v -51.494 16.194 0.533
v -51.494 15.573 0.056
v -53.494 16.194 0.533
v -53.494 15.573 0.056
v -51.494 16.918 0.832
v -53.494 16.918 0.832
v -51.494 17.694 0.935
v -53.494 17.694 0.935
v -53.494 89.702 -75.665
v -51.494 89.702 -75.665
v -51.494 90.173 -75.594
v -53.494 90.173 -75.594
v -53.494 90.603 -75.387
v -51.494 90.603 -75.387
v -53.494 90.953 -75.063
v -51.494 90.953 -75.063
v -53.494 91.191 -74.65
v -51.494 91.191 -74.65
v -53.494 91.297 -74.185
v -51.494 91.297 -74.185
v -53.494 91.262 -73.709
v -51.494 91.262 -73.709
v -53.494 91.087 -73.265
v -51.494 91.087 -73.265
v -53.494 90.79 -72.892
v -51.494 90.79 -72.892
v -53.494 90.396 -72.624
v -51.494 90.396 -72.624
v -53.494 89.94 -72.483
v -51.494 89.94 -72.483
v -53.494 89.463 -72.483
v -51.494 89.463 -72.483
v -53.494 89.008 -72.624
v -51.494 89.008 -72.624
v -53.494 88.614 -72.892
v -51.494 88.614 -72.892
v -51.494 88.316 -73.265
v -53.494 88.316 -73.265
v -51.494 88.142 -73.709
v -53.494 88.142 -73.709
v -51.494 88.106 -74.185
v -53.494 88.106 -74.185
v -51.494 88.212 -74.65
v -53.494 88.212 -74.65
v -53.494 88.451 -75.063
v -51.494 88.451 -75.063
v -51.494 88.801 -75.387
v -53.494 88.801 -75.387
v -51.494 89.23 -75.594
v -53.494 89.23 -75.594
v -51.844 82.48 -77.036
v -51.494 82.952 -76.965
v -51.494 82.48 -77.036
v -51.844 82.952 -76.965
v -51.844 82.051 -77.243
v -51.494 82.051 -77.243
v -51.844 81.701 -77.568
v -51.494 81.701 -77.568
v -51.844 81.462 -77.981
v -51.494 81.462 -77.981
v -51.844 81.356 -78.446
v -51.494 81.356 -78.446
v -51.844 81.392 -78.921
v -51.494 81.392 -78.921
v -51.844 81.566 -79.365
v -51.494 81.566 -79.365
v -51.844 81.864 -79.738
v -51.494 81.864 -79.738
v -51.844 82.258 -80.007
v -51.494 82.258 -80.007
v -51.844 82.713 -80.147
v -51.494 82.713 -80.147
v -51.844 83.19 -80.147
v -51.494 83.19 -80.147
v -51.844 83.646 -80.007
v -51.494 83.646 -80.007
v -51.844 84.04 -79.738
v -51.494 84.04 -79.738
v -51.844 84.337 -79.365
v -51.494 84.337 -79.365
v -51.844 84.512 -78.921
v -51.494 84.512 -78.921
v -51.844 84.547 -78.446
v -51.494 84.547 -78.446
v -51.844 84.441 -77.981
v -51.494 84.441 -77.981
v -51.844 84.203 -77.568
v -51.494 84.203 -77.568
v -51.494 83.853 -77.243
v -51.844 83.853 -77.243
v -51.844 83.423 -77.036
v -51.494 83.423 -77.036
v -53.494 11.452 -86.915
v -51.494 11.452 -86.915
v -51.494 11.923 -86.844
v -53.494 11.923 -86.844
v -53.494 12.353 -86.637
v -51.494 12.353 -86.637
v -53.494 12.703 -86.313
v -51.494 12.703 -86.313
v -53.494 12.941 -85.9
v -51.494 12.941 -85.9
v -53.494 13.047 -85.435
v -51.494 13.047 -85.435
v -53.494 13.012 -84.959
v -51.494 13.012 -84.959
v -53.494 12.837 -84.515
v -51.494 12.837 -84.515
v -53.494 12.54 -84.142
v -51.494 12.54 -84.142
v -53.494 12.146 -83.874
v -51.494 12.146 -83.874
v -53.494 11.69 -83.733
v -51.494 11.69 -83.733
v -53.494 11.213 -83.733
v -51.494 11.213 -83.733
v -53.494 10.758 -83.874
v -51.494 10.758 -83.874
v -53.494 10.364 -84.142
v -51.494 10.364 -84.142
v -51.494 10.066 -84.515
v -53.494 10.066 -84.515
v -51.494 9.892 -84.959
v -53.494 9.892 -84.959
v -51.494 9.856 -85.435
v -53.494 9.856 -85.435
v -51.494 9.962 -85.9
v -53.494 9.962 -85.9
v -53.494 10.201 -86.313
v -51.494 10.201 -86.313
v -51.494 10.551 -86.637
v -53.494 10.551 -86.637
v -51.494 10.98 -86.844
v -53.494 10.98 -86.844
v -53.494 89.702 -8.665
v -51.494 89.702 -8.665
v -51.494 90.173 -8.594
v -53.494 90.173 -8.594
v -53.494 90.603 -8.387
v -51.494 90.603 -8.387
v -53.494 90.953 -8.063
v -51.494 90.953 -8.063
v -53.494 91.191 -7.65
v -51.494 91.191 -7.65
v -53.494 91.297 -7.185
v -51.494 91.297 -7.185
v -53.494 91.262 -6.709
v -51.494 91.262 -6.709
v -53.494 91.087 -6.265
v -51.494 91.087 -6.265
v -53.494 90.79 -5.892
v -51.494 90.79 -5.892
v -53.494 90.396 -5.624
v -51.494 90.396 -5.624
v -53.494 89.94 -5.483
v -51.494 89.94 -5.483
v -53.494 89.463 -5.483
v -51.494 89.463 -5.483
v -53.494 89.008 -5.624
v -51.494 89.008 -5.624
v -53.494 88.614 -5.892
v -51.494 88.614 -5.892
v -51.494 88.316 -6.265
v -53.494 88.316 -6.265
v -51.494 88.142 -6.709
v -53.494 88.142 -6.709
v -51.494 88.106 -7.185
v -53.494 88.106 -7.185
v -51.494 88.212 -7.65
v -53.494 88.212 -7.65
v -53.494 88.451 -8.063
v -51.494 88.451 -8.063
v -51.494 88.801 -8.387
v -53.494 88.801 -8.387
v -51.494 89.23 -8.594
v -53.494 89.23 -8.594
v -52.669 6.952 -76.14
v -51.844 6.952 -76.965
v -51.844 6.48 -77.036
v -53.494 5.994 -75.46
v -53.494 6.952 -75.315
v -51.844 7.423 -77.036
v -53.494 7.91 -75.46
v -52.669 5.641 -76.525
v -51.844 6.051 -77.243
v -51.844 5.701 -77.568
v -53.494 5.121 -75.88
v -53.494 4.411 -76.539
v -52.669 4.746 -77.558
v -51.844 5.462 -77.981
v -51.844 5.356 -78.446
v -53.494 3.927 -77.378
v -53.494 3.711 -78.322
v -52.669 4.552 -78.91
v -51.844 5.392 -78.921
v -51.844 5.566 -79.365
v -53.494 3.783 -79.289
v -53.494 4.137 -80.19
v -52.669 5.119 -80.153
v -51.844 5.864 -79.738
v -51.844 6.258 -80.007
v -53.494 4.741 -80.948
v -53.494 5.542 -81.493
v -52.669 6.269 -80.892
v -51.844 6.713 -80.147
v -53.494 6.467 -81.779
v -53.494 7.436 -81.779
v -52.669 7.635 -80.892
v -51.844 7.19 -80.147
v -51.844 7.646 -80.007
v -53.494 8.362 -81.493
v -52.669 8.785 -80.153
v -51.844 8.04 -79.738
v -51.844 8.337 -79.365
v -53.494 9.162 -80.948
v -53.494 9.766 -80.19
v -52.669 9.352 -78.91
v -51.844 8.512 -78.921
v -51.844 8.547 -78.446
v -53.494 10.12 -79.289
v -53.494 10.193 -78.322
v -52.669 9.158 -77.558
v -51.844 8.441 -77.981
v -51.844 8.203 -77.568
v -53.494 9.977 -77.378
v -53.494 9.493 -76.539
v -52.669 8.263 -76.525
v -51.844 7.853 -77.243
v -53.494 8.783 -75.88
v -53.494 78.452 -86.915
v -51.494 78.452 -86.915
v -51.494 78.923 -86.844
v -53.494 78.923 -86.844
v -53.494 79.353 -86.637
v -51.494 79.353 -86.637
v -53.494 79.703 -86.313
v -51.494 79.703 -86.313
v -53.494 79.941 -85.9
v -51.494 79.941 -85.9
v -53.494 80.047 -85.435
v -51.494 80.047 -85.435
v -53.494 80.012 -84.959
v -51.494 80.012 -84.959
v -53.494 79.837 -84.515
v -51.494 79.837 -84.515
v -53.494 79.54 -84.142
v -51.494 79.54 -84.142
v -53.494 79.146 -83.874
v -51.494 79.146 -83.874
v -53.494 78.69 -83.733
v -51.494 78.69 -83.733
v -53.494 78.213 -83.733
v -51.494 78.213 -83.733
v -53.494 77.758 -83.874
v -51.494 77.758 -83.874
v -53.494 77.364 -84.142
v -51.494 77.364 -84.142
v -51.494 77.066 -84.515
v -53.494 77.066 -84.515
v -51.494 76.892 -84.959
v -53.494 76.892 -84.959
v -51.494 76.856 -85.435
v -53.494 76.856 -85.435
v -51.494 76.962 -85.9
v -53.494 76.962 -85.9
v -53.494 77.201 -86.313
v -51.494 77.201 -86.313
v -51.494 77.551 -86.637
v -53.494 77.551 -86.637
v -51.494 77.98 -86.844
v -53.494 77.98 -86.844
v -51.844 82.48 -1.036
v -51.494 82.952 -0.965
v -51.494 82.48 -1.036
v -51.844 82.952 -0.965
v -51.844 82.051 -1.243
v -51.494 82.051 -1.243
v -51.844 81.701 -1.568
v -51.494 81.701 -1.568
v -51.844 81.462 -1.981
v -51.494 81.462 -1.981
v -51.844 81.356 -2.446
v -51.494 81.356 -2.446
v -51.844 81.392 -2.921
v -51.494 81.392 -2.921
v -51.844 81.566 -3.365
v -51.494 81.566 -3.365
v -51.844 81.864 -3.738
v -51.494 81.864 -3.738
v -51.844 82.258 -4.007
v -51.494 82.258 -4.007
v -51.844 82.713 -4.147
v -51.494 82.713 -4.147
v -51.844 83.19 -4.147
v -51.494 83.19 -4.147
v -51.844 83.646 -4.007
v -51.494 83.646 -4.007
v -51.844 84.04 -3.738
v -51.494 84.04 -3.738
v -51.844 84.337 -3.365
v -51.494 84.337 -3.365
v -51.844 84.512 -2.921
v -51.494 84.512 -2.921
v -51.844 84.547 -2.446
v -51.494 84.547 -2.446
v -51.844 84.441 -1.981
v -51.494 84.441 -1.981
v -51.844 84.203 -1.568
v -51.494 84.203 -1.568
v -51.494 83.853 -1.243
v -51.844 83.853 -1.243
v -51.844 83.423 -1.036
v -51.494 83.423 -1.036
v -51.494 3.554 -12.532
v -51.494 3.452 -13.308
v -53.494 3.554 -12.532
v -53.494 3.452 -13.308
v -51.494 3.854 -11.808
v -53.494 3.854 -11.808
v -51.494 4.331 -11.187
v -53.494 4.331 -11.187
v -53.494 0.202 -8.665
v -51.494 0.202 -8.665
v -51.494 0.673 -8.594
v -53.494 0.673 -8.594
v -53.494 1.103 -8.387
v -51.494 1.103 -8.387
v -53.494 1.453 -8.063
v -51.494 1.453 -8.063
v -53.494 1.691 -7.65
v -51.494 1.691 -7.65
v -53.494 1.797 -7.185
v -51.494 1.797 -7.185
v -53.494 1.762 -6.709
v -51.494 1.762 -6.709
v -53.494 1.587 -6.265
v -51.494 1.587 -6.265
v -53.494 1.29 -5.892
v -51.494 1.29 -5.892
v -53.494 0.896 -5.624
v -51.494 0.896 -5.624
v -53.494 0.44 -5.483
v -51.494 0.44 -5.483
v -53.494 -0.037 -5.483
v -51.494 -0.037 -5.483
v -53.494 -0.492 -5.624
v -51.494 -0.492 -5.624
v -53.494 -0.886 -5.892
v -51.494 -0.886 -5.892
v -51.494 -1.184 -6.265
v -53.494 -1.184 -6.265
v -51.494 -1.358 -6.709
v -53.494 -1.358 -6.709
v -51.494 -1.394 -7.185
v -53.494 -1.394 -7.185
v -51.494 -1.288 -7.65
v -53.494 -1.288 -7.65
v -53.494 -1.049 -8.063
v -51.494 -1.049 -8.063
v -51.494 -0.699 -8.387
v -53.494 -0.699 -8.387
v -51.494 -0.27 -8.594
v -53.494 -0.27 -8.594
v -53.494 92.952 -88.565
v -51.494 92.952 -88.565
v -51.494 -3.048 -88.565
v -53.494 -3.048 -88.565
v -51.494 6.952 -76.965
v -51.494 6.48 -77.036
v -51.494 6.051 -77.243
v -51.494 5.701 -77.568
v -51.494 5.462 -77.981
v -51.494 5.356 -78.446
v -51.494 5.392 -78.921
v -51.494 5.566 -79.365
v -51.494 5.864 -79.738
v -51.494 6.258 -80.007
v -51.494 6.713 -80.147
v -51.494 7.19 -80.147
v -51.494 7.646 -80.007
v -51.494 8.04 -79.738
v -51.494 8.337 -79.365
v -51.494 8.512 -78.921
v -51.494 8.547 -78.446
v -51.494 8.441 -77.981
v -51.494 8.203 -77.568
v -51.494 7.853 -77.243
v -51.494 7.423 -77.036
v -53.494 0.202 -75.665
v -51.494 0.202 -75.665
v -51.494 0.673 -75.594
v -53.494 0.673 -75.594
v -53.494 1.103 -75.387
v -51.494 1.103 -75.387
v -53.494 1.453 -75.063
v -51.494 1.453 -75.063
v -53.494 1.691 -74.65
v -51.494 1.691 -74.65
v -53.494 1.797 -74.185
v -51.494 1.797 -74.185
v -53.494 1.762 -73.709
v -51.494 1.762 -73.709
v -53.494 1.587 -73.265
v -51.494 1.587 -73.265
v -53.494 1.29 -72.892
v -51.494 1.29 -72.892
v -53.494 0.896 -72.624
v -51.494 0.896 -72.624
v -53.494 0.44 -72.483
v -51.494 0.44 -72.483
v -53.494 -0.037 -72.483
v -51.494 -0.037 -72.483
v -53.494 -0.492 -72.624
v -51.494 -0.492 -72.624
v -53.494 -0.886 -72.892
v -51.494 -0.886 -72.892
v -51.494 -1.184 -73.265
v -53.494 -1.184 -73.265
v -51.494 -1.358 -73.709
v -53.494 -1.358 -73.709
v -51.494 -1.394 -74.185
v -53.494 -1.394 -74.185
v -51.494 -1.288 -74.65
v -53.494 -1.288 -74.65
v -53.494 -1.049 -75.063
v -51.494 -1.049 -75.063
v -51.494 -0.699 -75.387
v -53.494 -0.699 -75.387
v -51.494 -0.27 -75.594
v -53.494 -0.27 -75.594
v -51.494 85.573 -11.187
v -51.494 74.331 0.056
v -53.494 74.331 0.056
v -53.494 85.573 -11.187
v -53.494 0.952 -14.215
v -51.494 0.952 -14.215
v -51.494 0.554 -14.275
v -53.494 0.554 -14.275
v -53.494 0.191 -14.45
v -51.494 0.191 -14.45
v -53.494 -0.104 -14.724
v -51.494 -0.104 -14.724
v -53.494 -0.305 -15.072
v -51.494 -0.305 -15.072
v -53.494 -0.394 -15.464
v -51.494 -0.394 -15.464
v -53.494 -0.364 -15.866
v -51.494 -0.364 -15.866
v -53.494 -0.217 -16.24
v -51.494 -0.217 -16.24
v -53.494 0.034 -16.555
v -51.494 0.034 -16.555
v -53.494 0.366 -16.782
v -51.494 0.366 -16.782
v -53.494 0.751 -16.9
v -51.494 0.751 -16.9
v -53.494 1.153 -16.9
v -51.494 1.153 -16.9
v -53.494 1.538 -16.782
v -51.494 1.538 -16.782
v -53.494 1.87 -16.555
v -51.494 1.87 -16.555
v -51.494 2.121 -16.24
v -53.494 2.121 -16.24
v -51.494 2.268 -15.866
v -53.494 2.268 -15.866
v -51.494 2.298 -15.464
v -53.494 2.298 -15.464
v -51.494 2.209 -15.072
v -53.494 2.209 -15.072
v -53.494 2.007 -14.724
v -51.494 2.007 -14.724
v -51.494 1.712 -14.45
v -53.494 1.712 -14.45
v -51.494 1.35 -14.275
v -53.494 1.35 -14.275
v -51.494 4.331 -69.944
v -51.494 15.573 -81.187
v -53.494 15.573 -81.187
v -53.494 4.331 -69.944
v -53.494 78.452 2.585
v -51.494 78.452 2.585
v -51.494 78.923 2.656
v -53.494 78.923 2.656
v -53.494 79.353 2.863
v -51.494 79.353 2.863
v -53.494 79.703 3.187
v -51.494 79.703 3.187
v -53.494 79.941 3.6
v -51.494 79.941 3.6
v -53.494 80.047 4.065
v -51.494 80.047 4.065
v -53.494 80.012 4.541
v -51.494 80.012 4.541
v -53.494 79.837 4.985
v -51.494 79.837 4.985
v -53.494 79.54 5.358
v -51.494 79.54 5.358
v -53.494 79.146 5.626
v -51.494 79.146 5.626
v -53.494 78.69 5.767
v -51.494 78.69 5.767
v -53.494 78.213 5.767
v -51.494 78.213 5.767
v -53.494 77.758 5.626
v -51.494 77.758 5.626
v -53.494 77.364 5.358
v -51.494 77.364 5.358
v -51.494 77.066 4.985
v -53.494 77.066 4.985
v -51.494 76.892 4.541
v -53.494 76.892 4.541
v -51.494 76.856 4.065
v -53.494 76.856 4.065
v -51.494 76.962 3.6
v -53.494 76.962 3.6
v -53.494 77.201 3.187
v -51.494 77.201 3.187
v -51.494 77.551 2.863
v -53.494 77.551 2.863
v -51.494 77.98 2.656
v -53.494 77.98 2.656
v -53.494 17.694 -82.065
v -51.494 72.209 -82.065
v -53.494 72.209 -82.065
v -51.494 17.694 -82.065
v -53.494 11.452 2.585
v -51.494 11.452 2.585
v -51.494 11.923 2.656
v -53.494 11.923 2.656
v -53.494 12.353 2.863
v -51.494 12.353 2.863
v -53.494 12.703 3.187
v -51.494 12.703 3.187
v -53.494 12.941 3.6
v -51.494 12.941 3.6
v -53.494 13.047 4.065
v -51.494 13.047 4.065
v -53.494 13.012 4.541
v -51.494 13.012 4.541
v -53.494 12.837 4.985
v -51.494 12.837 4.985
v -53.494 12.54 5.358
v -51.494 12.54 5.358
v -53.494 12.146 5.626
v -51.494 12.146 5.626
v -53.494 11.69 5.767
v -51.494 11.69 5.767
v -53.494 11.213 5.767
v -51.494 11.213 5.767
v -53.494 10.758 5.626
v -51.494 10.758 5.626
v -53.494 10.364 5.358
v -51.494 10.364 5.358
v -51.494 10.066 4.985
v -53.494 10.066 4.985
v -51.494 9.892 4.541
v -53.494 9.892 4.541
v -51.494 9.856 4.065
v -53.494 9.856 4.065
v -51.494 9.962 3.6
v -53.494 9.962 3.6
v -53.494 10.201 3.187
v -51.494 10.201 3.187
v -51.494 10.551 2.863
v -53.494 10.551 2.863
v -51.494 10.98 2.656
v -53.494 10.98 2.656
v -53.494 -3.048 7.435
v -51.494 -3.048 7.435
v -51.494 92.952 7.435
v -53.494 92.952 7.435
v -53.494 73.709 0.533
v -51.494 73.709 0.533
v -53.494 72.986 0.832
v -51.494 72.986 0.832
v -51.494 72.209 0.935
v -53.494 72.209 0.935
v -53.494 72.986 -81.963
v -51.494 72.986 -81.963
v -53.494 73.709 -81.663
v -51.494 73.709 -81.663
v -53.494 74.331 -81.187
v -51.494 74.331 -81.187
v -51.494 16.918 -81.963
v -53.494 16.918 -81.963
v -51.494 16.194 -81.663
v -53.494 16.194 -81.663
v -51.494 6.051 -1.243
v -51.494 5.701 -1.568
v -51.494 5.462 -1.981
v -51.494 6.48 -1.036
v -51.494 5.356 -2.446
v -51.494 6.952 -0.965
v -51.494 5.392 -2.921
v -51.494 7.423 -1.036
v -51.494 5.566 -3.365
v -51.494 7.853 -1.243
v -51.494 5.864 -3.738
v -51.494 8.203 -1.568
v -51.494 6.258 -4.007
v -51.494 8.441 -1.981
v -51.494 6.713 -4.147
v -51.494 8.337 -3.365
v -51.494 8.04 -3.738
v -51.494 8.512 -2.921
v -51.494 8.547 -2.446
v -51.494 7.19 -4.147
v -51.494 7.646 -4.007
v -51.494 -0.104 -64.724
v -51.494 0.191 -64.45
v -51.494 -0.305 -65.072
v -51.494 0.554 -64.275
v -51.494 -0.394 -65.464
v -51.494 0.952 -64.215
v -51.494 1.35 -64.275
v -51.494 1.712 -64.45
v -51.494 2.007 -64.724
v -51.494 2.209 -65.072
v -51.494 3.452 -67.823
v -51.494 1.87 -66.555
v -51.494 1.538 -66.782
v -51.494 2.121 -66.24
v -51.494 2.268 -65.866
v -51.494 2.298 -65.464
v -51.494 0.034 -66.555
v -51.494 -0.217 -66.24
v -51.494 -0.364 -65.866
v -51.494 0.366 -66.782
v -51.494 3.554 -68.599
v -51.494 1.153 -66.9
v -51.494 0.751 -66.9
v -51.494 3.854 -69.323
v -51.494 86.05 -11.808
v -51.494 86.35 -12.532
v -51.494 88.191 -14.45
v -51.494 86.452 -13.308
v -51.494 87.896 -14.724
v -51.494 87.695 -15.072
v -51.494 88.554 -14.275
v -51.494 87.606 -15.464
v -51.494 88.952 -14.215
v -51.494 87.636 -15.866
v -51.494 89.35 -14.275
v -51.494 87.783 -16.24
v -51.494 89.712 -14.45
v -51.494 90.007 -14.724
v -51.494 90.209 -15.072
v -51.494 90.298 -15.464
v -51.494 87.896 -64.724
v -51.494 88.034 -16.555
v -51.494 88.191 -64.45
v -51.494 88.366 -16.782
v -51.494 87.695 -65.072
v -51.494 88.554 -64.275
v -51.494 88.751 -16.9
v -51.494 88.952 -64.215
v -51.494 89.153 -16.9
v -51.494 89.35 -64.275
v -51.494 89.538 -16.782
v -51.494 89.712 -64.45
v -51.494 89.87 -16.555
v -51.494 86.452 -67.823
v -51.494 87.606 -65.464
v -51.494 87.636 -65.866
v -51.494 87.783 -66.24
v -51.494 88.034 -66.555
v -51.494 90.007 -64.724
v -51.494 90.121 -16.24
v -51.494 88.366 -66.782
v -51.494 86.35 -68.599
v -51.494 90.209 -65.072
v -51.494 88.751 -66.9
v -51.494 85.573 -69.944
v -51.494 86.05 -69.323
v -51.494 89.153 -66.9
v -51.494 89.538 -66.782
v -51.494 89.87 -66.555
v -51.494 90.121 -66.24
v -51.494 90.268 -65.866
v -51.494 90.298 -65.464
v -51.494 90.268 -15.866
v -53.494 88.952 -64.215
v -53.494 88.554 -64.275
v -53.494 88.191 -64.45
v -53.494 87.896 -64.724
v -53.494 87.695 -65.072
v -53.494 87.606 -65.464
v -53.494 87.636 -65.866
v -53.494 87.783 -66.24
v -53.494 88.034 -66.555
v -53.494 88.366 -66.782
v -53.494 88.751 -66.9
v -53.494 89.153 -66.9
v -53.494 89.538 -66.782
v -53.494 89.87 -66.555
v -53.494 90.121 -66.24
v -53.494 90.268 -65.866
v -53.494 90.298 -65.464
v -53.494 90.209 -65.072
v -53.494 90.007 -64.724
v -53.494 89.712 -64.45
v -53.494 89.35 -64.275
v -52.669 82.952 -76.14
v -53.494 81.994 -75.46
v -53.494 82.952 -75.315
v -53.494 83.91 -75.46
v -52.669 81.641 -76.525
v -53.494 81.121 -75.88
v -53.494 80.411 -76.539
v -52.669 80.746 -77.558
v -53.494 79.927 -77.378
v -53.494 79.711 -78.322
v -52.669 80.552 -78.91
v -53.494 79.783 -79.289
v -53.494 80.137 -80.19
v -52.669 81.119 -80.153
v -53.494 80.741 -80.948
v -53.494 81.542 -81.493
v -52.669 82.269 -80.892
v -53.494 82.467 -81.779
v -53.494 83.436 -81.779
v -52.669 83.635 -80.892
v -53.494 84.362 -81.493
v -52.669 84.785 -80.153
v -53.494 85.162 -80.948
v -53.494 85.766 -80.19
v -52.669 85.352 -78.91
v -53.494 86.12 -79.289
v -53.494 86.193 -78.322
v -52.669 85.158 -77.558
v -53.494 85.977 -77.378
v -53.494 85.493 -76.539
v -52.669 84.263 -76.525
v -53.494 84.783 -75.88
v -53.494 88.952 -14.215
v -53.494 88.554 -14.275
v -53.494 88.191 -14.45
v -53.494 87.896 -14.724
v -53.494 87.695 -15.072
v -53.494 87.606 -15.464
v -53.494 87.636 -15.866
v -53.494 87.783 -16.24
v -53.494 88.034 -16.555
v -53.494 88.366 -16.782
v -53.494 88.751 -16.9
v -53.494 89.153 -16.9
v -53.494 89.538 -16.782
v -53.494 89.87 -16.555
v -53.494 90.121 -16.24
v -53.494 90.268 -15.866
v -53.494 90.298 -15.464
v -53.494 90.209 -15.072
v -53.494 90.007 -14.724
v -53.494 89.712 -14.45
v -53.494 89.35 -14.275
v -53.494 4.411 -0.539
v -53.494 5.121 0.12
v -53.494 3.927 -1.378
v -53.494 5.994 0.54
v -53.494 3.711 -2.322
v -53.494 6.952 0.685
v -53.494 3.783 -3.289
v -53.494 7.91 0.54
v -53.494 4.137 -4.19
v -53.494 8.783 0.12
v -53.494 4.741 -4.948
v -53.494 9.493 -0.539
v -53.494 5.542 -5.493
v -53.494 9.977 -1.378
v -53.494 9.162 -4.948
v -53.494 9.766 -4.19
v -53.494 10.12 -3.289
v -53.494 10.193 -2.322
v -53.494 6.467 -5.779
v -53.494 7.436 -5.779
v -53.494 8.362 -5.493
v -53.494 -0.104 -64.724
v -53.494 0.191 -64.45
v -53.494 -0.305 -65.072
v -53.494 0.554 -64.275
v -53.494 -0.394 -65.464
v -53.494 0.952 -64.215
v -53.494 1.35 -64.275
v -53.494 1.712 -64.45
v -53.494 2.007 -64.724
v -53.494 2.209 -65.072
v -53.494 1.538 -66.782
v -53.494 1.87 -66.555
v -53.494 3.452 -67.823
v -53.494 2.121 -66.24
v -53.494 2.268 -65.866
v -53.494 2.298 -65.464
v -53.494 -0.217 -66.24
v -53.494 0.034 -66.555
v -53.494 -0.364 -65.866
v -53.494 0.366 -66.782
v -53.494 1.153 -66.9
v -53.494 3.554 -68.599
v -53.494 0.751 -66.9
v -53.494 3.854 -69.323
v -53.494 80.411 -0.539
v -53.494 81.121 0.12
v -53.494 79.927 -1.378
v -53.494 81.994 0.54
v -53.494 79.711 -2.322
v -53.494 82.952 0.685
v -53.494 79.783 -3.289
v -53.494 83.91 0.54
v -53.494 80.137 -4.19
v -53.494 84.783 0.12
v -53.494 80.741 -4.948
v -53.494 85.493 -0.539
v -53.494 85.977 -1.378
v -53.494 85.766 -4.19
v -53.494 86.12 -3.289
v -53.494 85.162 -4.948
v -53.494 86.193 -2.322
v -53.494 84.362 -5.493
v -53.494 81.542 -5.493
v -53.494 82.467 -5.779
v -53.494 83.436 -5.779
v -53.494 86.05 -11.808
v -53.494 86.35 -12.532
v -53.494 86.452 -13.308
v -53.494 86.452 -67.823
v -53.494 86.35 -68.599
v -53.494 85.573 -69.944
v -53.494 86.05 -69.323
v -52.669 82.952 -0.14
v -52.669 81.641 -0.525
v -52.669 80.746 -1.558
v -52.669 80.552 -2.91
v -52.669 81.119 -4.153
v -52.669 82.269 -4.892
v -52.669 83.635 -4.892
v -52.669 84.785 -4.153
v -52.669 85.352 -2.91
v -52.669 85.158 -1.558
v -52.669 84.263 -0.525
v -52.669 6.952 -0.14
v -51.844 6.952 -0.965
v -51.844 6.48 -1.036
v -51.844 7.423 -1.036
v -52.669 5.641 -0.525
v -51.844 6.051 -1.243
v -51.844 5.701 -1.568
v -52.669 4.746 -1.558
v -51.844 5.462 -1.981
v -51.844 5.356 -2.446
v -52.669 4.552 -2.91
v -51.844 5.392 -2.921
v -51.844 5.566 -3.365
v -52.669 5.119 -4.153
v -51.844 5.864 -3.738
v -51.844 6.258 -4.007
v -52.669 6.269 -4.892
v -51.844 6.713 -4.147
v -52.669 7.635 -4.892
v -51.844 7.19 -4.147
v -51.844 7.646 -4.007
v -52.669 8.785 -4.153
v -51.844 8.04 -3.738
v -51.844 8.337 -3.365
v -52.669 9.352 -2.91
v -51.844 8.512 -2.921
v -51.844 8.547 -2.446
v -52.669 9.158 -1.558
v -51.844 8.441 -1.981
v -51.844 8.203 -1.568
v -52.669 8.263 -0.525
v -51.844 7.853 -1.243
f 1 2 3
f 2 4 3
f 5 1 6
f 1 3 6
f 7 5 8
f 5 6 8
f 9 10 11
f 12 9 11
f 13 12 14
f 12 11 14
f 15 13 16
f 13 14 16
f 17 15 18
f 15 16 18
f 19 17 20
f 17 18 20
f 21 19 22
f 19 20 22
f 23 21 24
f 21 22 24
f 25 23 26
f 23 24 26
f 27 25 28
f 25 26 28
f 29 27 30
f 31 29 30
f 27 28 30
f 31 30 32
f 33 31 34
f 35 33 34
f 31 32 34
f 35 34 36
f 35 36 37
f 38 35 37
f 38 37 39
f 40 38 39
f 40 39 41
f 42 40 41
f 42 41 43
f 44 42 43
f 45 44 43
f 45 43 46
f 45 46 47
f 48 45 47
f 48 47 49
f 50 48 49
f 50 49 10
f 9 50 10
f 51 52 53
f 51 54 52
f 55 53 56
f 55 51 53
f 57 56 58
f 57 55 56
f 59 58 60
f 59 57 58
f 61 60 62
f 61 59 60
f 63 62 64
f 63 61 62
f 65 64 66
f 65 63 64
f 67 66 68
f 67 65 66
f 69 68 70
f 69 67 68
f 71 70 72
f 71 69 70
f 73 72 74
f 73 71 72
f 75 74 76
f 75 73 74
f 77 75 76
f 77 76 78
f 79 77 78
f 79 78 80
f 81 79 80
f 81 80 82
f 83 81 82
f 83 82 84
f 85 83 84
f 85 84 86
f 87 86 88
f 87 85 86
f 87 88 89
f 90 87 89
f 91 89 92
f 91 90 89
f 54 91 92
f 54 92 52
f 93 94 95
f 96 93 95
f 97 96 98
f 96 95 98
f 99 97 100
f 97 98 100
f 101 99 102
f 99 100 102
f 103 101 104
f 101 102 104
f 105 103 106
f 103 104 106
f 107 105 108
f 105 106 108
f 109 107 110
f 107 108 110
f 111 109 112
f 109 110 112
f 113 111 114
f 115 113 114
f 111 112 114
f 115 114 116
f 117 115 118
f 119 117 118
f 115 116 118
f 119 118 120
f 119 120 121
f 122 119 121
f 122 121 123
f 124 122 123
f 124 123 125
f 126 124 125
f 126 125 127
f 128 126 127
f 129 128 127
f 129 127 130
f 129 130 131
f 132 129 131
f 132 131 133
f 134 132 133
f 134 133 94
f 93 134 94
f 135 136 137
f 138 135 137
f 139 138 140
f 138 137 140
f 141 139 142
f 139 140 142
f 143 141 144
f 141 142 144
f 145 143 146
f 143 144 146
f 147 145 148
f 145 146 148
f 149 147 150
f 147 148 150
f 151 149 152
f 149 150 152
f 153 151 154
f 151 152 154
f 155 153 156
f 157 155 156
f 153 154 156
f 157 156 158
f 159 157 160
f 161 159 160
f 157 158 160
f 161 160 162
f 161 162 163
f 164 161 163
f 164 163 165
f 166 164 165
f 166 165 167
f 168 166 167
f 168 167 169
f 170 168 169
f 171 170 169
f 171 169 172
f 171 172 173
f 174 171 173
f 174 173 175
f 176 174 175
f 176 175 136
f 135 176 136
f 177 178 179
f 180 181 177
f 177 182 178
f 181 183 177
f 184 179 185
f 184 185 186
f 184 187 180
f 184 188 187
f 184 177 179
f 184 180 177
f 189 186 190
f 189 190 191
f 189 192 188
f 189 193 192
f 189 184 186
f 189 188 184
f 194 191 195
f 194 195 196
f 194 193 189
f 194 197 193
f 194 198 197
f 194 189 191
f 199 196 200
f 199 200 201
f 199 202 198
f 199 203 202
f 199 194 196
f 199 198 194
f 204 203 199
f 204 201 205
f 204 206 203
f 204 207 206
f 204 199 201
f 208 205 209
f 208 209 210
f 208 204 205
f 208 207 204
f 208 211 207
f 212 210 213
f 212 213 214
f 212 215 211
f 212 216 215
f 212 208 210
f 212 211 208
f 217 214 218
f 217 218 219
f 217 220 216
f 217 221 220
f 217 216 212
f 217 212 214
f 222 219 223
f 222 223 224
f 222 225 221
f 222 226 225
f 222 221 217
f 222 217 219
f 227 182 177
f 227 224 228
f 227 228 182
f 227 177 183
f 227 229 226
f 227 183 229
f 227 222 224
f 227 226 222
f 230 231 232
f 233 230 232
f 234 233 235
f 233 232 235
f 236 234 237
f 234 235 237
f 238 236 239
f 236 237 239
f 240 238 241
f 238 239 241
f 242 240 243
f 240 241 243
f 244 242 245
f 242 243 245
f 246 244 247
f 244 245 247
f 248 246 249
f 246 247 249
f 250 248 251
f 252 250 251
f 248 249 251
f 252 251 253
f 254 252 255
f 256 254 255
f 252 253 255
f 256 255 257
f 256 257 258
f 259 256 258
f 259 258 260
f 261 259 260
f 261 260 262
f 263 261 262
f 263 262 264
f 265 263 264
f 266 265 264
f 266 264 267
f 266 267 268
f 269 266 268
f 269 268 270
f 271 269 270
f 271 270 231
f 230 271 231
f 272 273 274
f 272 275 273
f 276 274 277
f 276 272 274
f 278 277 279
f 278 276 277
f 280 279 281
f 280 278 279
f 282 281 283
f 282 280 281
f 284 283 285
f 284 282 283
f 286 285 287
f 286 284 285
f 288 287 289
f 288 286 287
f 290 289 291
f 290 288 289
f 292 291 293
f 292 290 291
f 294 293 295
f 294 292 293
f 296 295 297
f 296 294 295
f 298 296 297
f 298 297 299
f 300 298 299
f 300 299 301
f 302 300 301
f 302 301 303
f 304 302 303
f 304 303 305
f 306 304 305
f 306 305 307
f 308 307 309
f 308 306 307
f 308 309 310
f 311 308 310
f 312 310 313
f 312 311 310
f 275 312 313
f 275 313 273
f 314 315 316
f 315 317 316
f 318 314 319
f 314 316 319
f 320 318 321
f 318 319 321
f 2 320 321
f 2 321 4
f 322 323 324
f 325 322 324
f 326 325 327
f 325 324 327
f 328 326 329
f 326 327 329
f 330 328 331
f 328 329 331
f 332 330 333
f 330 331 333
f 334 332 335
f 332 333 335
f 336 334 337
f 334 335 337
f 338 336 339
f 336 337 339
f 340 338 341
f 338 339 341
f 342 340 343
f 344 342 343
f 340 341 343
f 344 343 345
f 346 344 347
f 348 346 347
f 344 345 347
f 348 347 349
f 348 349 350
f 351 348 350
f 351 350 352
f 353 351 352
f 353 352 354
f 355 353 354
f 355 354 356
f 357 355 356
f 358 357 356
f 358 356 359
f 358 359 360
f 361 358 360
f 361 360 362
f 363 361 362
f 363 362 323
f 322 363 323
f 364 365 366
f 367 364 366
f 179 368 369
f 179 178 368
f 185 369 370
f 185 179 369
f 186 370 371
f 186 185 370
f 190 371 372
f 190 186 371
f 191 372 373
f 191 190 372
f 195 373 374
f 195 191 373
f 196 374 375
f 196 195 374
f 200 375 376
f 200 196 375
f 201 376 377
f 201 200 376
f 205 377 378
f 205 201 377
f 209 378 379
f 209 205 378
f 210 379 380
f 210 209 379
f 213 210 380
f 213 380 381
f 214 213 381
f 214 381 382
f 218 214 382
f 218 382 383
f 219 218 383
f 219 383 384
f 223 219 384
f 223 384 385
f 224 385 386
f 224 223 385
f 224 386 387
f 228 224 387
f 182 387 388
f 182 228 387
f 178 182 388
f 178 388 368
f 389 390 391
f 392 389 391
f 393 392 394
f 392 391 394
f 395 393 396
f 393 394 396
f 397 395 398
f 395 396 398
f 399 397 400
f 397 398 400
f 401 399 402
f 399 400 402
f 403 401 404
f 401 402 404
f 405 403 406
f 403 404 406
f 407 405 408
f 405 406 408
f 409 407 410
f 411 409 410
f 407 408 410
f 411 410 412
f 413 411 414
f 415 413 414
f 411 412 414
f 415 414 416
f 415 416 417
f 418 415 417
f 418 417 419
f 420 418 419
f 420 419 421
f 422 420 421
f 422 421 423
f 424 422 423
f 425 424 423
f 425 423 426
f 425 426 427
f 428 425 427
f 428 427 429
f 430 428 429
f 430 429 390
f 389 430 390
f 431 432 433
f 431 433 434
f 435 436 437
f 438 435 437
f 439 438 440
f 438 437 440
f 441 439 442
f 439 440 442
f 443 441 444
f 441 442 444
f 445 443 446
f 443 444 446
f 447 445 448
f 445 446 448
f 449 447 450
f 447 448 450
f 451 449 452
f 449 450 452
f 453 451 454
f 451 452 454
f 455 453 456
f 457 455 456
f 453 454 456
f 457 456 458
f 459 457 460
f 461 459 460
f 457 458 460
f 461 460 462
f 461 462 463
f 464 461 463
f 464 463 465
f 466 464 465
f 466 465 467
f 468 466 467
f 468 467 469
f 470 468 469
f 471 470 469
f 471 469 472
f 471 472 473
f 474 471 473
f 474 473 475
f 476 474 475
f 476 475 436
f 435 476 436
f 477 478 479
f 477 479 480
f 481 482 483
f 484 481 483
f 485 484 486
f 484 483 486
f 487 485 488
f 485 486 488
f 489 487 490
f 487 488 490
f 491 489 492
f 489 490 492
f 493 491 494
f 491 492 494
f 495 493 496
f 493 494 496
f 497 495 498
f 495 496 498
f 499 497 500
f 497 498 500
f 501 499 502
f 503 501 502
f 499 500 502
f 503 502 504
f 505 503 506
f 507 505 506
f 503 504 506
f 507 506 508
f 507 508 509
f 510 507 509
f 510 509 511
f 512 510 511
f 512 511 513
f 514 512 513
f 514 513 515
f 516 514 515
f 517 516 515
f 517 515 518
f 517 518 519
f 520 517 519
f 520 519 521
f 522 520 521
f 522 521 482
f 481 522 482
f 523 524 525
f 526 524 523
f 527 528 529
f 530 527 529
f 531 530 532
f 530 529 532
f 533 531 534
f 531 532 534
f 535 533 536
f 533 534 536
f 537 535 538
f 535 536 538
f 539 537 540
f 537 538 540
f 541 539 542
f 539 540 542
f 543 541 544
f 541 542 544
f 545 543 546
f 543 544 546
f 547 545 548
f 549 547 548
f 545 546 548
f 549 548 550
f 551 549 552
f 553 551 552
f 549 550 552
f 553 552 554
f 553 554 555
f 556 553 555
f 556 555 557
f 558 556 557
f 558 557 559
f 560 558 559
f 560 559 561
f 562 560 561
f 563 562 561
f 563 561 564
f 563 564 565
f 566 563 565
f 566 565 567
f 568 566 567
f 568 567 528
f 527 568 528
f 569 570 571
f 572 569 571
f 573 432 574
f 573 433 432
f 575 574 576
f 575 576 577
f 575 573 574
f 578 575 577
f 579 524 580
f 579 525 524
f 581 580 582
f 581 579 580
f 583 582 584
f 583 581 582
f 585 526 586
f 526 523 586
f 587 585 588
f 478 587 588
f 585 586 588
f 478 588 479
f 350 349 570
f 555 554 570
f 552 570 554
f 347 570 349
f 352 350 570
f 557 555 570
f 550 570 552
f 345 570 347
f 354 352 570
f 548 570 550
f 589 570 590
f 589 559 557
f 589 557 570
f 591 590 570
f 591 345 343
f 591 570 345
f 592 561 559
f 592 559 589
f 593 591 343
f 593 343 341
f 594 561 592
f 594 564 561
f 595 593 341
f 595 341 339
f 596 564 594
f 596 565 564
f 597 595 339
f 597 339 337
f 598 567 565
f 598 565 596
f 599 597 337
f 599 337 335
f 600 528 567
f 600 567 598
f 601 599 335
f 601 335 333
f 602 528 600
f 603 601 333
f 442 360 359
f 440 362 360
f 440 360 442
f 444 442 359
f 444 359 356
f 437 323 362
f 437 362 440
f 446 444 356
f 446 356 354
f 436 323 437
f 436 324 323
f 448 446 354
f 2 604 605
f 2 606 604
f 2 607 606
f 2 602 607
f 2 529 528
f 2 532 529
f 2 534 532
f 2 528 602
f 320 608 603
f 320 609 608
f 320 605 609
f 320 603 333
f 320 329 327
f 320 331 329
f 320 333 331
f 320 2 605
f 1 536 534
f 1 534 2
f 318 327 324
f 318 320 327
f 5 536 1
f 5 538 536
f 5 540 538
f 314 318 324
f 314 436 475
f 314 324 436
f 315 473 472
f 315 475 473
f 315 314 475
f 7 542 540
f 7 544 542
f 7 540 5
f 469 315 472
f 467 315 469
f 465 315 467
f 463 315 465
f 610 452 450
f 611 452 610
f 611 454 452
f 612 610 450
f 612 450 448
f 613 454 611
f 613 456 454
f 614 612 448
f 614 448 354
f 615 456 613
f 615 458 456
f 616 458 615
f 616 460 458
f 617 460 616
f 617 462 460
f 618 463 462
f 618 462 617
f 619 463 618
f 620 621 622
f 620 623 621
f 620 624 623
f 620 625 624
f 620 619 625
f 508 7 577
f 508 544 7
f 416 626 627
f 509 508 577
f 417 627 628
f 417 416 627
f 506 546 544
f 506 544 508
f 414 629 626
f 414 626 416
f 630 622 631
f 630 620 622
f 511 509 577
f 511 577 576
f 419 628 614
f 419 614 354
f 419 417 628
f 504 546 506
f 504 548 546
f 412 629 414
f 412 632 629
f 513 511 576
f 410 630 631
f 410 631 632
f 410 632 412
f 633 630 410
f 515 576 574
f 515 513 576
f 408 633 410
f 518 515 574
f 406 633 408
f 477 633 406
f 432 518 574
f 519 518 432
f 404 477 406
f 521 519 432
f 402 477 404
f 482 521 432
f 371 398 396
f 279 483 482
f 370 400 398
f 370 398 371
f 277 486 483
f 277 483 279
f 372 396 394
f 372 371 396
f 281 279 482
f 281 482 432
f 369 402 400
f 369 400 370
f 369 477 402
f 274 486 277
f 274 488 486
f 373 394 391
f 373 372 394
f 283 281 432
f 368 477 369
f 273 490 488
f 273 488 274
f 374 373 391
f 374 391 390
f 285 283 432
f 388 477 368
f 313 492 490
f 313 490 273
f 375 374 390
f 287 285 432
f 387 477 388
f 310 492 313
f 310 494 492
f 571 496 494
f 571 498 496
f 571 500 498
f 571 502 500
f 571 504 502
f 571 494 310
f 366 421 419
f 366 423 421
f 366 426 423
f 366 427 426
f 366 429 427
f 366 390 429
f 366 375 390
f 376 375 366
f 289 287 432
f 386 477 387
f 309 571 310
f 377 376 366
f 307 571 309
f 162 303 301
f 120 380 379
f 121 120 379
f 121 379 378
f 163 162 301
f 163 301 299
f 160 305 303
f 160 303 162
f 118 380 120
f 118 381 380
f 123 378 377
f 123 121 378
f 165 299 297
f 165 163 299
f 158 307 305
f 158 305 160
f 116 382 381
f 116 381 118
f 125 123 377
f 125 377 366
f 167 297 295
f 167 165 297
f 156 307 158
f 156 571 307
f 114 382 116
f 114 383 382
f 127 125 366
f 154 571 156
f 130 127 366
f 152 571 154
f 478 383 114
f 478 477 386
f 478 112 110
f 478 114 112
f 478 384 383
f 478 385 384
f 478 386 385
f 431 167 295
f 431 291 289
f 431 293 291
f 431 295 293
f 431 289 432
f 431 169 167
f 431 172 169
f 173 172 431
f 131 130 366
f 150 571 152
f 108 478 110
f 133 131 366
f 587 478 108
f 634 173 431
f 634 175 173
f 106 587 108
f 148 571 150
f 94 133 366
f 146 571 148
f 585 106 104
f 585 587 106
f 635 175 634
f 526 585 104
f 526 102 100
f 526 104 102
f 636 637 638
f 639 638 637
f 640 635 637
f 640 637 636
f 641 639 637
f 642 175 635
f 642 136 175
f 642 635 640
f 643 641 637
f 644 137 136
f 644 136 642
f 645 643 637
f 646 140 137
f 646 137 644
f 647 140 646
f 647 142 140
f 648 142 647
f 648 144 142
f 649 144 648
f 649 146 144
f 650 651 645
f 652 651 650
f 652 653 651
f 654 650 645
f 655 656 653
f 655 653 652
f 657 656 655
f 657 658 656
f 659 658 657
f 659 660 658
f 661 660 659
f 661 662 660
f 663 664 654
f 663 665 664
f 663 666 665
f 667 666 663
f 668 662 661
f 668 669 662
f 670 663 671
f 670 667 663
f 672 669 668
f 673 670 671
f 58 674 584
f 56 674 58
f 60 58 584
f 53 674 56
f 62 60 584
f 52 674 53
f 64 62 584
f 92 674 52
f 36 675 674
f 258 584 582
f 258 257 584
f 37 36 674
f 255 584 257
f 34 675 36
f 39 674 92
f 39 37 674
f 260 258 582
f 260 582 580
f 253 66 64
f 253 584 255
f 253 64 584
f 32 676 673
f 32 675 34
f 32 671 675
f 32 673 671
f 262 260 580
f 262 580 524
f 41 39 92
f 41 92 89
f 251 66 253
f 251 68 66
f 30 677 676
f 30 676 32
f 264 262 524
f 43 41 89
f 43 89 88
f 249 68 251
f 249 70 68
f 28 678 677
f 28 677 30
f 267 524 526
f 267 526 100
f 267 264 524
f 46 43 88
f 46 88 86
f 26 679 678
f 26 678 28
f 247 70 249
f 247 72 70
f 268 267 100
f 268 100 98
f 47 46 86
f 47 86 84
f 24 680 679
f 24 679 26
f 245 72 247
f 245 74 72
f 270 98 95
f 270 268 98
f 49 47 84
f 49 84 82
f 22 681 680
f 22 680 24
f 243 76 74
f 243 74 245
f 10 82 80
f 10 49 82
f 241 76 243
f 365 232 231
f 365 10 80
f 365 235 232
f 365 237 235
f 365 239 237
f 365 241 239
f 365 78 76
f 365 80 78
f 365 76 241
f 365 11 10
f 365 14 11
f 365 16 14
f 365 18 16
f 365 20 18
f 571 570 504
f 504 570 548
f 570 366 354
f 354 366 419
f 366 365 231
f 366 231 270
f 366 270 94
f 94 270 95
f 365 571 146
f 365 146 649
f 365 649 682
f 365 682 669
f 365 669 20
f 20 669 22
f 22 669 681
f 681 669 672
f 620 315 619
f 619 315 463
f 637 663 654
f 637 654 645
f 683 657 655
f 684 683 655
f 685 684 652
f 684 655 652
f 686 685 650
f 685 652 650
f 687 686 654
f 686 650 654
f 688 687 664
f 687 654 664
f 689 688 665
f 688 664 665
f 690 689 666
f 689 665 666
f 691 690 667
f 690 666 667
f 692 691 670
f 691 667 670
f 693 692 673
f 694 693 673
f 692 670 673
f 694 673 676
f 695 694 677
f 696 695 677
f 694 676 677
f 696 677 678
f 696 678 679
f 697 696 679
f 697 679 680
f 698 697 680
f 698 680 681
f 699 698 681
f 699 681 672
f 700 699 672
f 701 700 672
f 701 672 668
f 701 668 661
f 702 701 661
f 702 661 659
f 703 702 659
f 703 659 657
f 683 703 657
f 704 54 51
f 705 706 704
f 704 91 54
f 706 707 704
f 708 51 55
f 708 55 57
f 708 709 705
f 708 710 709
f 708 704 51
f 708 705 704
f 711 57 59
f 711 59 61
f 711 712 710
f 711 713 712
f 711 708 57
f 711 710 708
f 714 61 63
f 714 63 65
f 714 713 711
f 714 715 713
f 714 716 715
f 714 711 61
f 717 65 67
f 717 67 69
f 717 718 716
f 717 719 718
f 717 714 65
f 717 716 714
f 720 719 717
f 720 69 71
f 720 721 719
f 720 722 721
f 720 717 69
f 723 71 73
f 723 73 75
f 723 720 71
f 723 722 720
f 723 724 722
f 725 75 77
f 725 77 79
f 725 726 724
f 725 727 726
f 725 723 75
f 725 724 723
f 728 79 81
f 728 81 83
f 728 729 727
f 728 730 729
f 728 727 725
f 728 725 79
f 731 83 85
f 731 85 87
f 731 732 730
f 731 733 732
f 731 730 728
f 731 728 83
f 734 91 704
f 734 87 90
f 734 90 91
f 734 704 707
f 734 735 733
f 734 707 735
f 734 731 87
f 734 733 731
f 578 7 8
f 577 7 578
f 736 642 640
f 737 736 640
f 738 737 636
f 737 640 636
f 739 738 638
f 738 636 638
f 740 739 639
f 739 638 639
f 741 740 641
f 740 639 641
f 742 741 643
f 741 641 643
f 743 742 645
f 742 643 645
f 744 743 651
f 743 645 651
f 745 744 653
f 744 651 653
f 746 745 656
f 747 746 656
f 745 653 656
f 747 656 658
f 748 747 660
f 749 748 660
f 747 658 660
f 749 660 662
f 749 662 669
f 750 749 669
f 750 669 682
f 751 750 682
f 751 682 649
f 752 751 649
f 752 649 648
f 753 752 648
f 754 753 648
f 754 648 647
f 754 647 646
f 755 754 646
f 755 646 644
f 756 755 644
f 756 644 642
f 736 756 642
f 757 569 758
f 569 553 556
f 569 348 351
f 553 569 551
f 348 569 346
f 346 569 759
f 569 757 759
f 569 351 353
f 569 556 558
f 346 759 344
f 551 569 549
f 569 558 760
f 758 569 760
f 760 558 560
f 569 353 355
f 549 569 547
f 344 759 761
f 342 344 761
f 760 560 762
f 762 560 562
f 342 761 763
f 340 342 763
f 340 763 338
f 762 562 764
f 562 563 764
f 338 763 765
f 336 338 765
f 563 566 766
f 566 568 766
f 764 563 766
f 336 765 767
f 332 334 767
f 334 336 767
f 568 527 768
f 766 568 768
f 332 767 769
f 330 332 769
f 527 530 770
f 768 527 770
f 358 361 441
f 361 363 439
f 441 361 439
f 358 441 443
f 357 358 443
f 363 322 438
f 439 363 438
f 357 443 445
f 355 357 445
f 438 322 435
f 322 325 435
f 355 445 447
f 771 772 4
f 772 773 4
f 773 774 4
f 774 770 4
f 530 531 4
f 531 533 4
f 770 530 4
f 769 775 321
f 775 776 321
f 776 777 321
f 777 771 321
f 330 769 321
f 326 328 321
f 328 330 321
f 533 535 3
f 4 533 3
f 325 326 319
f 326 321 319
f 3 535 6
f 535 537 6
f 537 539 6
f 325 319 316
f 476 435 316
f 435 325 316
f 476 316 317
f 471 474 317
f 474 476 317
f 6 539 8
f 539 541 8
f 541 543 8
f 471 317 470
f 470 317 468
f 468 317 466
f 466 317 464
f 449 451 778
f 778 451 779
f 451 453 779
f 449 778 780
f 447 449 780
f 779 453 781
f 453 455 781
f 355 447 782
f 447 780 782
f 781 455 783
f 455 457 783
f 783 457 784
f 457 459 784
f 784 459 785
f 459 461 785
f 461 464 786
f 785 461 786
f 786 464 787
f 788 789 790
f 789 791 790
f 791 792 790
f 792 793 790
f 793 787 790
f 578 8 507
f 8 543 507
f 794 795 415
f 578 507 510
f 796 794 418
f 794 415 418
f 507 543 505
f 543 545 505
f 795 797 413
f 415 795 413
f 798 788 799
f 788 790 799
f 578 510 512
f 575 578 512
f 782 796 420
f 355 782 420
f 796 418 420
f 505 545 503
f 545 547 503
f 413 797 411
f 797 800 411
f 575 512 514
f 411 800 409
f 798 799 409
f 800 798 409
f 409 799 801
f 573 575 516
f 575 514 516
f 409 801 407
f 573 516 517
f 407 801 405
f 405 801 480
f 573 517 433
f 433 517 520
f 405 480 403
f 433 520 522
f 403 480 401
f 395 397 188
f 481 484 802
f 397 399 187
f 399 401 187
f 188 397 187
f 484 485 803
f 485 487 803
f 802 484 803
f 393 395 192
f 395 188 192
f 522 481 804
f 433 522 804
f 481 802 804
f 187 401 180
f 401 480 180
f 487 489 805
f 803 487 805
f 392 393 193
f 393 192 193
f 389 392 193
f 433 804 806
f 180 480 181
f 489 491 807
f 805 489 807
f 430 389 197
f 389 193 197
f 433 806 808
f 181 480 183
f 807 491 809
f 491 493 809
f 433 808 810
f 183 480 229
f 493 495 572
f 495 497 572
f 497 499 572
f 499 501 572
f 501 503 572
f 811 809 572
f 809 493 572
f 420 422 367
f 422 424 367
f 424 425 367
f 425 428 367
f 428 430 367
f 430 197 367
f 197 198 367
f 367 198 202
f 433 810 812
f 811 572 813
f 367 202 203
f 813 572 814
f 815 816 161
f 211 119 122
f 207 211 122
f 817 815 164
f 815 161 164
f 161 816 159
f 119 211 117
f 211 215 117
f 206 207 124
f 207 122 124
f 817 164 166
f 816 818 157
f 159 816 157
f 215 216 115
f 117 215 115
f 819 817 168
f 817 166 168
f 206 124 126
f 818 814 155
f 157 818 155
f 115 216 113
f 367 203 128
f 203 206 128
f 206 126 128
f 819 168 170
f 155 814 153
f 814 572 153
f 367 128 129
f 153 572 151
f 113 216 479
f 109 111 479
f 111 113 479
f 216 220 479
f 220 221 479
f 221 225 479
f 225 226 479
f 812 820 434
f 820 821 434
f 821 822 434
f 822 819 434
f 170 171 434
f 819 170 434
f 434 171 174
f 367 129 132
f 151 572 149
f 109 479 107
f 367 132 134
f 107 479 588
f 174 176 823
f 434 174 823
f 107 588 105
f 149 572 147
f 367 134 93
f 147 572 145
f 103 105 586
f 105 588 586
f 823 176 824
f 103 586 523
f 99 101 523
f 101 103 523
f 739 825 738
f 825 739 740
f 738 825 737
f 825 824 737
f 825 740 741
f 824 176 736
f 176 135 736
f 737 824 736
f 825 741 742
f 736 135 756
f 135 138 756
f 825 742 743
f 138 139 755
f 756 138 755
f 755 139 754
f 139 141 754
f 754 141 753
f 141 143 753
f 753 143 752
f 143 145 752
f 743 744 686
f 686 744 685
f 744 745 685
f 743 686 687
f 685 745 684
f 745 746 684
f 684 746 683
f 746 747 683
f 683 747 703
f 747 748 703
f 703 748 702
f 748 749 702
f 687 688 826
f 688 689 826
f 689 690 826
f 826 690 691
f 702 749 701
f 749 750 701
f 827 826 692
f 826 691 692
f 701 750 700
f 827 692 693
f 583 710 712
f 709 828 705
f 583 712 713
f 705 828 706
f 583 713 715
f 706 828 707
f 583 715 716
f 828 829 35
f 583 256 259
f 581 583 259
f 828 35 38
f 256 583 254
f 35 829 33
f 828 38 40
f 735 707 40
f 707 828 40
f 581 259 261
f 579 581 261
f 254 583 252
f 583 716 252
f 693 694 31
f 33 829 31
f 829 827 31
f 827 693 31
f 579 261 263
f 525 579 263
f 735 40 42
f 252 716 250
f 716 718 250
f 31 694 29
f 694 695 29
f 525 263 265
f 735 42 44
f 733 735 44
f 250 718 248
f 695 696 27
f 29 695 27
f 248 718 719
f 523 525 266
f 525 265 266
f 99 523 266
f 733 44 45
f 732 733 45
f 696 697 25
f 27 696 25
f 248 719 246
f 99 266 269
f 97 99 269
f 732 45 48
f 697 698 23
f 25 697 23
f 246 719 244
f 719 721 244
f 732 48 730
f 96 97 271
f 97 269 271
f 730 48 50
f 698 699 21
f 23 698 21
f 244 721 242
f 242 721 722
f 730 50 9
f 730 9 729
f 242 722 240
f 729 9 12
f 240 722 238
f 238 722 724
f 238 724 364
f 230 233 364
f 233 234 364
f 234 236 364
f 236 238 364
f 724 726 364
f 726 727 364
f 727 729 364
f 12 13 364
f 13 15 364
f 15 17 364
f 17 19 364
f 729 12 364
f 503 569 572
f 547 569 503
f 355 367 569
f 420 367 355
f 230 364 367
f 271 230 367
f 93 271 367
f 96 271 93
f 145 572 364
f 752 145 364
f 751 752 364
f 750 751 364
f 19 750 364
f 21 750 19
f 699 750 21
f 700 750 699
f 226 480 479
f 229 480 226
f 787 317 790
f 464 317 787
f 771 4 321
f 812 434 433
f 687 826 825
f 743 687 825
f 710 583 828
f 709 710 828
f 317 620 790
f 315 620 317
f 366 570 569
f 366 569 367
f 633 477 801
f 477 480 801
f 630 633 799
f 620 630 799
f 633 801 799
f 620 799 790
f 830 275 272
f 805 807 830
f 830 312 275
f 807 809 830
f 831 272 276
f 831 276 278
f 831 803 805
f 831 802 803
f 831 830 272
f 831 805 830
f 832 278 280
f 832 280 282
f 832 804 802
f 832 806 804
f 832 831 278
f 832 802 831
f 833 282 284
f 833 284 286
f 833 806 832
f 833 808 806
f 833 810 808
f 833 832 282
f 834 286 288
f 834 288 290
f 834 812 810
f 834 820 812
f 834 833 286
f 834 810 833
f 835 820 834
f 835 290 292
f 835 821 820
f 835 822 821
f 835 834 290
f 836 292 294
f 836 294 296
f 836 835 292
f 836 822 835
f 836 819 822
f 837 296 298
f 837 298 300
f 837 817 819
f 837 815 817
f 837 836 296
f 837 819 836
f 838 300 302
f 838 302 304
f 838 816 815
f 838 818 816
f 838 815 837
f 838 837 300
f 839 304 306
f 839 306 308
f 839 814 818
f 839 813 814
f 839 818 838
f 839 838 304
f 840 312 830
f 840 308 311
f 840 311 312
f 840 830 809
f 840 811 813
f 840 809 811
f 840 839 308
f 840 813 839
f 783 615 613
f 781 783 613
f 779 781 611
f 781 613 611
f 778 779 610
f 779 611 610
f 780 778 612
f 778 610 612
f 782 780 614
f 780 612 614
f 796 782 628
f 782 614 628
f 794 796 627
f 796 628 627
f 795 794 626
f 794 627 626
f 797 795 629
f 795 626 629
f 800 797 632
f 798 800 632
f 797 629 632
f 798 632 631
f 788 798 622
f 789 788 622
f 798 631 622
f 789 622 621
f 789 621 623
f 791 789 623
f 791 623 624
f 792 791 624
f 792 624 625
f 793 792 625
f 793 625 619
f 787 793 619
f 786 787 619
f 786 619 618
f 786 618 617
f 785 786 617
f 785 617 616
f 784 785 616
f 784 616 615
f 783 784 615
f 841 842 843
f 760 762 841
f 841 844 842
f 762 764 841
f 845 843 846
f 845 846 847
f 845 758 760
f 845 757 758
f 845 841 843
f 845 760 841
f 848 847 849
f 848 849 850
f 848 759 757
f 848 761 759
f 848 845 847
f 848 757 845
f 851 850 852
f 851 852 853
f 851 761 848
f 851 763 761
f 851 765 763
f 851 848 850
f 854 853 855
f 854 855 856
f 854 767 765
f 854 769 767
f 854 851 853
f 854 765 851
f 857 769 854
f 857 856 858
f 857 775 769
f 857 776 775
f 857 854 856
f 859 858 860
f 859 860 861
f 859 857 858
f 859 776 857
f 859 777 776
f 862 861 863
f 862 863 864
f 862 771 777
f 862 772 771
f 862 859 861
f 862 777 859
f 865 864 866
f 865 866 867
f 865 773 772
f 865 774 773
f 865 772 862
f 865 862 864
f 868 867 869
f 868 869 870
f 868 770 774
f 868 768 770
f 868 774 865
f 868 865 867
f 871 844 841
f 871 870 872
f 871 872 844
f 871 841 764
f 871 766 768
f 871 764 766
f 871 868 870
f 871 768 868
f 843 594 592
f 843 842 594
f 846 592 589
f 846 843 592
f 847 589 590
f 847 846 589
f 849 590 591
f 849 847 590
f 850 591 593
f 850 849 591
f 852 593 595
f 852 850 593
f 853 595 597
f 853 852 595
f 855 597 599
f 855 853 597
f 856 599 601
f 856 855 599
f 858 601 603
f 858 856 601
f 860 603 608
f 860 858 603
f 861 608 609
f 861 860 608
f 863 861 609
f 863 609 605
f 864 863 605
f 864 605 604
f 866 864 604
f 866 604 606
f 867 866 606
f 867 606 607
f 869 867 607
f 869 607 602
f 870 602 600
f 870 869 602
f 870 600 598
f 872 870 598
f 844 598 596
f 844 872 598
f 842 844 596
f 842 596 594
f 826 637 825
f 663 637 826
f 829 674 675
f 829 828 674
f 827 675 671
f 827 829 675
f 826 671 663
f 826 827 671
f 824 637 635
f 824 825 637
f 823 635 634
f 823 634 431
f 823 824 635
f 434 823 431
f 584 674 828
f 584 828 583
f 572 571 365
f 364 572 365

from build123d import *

# Parameters (mm, degrees)
BOSS_EXTRUDE2_DEPTH                          = 2
F_3_2_3_2_DIAMETER_HOLE3_D                   = 3.2
CSK_FOR_M3_FLAT_COUNTERSUNK_HEAD_SCR_2_COUNT = 2
CSK_FOR_M3_FLAT_COUNTERSUNK_HEAD_SCR_2_PITCH = 76
CSK_FOR_M3_FLAT_COUNTERSUNK_HEAD_SCR_3_COUNT = 2
CSK_FOR_M3_FLAT_COUNTERSUNK_HEAD_SCR_3_PITCH = 107.48023074
CSK_FOR_M3_FLAT_COUNTERSUNK_HEAD_SCR_4_COUNT = 2
CSK_FOR_M3_FLAT_COUNTERSUNK_HEAD_SCR_4_PITCH = 76
F_2_7_2_7_DIAMETER_HOLE1_D                   = 2.7
FILLET1_R                                    = 3
SKETCH26_W                                   = 6.5
SKETCH26_H                                   = 6.5
BOSS_EXTRUDE3_DEPTH                          = 2


with BuildPart() as part:
    # Sketch2 → Boss-Extrude2 (new body)
    with BuildSketch(Plane.ZY.offset(51.493641502)):
        Polygon((0.93465612, 3.45185693), (7.43465612, 3.45185693), (7.43465612, 86.45185693), (0.93465612, 86.45185693), (0.93465612, 92.95185693), (-82.06534388, 92.95185693), (-82.06534388, 86.45185693), (-88.56534388, 86.45185693), (-88.56534388, 3.45185693), (-82.06534388, 3.45185693), (-82.06534388, -3.04814307), (0.93465612, -3.04814307), align=None)
        Polygon((-82.06534388, 73.45185693), (-82.06534388, 16.45185693), (-69.06534388, 3.45185693), (-12.06534388, 3.45185693), (0.93465612, 16.45185693), (0.93465612, 73.45185693), (-12.06534388, 86.45185693), (-69.06534388, 86.45185693), align=None, mode=Mode.SUBTRACT)
    extrude(amount=BOSS_EXTRUDE2_DEPTH)

    # Ø3.2 (3.2) Diameter Hole3 (through all)
    with Locations(Plane.ZY.offset(53.493641502)):
        with Locations((-74.06534388, 0.20185693), (-85.31534388, 11.45185693), (-85.31534388, 78.45185693), (-74.06534388, 89.70185693), (-7.06534388, 89.70185693), (4.18465612, 78.45185693), (4.18465612, 11.45185693), (-7.06534388, 0.20185693)):
            Hole(F_3_2_3_2_DIAMETER_HOLE3_D / 2)

    # Sketch24 → CSK for M3 Flat Countersunk Head Screw5 (revolve, cut)
    with BuildSketch(Plane(origin=(-53.493641502, 6.95185693, -78.56534388), x_dir=(0, 0, 1), z_dir=(0, 1, 0))):
        Polygon((0, 0), (0, 2), (1.6, 2), (1.6, 1.65), (3.25, 0), align=None)
    csk_for_m3_flat_countersunk_head_screw5 = revolve(axis=Axis((-59.843641502, 6.95185693, -78.56534388), (1, 0, 0)), mode=Mode.SUBTRACT)

    # CSK for M3 Flat Countersunk Head Scr 2: CSK for M3 Flat Countersunk Head Screw5 ×2
    with Locations(*[(0, i * CSK_FOR_M3_FLAT_COUNTERSUNK_HEAD_SCR_2_PITCH, 0) for i in range(1, CSK_FOR_M3_FLAT_COUNTERSUNK_HEAD_SCR_2_COUNT)]):
        add(csk_for_m3_flat_countersunk_head_screw5, mode=Mode.SUBTRACT)

    # CSK for M3 Flat Countersunk Head Scr 3: CSK for M3 Flat Countersunk Head Screw5 ×2
    with Locations(*[Vector(0, 0.7071067811865478, 0.7071067811865472) * (i * CSK_FOR_M3_FLAT_COUNTERSUNK_HEAD_SCR_3_PITCH) for i in range(1, CSK_FOR_M3_FLAT_COUNTERSUNK_HEAD_SCR_3_COUNT)]):
        add(csk_for_m3_flat_countersunk_head_screw5, mode=Mode.SUBTRACT)

    # CSK for M3 Flat Countersunk Head Scr 4: CSK for M3 Flat Countersunk Head Screw5 ×2
    with Locations(*[(0, 0, i * CSK_FOR_M3_FLAT_COUNTERSUNK_HEAD_SCR_4_PITCH) for i in range(1, CSK_FOR_M3_FLAT_COUNTERSUNK_HEAD_SCR_4_COUNT)]):
        add(csk_for_m3_flat_countersunk_head_screw5, mode=Mode.SUBTRACT)

    # Ø2.7 (2.7) Diameter Hole1 (through all)
    with Locations(Plane(origin=(-53.493641502, 88.95185693, -65.56534388), x_dir=(0, 0, -1), z_dir=(-1, 0, 0))):
        with Locations((0, 0), (-50, 0), (0, 88), (-50, 88)):
            Hole(F_2_7_2_7_DIAMETER_HOLE1_D / 2)

    # Fillet1
    fillet1_edges = [part.edges().sort_by_distance(p)[0] for p in [
        (-52.493641502, 86.45185693, -69.06534388),
        (-52.493641502, 73.45185693, -82.06534388),
        (-52.493641502, 16.45185693, -82.06534388),
        (-52.493641502, 3.45185693, -69.06534388),
        (-52.493641502, 3.45185693, -12.06534388),
        (-52.493641502, 16.45185693, 0.93465612),
        (-52.493641502, 73.45185693, 0.93465612),
        (-52.493641502, 86.45185693, -12.06534388),
    ]]
    fillet(fillet1_edges, radius=FILLET1_R)

    # Sketch26 → Boss-Extrude3 (add)
    with BuildSketch(Plane(origin=(-51.493641502, 0, 0), x_dir=(0, 0, -1), z_dir=(1, 0, 0))):
        with Locations((-4.18465612, 89.70185693)):
            Rectangle(SKETCH26_W, SKETCH26_H)
        with Locations((85.31534388, 89.70185693)):
            Rectangle(SKETCH26_W, SKETCH26_H)
        with Locations((85.31534388, 0.20185693)):
            Rectangle(SKETCH26_W, SKETCH26_H)
        with Locations((-4.18465612, 0.20185693)):
            Rectangle(SKETCH26_W, SKETCH26_H)
    extrude(amount=-BOSS_EXTRUDE3_DEPTH)


solid = part.part
